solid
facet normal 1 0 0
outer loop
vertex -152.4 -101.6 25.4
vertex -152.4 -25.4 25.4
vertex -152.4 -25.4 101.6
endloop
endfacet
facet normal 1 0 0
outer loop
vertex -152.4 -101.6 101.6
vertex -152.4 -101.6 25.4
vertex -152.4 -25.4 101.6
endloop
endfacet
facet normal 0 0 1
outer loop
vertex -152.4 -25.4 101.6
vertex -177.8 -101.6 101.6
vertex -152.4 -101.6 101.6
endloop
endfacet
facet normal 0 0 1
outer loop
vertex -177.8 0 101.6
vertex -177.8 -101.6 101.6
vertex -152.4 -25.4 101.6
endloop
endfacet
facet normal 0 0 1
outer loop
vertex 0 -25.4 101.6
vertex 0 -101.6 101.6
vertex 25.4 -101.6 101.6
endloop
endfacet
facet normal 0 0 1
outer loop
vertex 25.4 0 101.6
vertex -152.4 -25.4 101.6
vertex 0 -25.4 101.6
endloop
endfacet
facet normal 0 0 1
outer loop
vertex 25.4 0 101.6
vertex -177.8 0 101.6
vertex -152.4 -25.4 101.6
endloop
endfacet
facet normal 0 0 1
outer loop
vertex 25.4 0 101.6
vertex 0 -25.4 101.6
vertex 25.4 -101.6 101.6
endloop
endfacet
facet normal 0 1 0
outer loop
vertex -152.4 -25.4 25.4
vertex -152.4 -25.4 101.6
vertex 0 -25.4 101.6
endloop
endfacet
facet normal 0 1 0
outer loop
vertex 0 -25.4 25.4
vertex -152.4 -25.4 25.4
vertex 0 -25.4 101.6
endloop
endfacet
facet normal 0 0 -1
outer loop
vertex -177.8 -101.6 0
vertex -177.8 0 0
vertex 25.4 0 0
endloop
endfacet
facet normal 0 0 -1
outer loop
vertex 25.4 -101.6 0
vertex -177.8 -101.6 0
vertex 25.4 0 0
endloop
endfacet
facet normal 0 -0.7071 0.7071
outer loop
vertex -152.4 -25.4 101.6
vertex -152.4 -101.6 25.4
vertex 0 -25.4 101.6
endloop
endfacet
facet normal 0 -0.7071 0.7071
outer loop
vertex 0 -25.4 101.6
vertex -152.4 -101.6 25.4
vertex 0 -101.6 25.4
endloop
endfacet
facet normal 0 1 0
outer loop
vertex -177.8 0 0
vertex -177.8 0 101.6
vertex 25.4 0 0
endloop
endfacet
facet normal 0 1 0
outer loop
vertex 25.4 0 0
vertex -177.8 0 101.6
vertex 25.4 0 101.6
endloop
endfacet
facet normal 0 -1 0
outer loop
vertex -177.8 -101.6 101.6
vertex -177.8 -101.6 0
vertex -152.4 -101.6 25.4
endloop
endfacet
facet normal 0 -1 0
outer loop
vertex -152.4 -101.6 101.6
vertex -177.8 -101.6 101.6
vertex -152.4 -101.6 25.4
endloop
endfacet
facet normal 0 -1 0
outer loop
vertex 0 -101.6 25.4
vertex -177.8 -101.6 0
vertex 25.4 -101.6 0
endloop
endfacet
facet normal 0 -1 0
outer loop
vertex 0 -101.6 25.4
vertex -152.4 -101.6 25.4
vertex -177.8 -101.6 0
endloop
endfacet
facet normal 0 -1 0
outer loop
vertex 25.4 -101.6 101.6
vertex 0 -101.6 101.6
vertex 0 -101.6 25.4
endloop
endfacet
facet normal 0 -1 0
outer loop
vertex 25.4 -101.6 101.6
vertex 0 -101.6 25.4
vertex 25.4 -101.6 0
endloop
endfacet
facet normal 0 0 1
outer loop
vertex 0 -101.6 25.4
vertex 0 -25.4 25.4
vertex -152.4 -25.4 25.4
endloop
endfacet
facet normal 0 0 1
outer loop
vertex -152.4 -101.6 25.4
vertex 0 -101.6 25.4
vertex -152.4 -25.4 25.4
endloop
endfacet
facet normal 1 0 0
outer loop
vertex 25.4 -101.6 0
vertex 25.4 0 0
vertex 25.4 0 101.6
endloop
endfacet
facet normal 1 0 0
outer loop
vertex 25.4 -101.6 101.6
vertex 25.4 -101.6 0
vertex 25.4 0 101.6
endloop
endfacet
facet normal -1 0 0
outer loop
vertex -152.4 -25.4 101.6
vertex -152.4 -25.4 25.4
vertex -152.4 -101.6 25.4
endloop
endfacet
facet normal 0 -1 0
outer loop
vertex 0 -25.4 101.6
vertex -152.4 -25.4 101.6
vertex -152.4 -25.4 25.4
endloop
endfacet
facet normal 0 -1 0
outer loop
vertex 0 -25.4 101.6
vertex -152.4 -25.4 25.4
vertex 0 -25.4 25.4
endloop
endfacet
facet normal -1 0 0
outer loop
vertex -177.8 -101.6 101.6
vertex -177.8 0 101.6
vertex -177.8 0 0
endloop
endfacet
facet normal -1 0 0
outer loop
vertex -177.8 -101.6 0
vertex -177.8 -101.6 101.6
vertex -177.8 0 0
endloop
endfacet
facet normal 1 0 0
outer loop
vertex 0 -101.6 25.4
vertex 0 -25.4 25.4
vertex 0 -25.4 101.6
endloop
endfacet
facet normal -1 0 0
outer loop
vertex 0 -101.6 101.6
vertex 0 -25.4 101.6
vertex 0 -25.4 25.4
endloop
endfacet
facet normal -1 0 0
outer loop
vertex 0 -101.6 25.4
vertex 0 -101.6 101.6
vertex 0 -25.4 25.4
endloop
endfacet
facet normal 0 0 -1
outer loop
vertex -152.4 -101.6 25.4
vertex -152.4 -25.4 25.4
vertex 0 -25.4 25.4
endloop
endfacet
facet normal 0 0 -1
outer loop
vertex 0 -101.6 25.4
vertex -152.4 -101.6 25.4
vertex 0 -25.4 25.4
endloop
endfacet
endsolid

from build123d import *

# Parameters (mm, degrees)
F1_DEPTH = 101.6
F0_W     = 152.4
F0_H     = 76.2
F2_DEPTH = 25.4
F3_DEPTH = 76.2
F4_SIZE  = 76.19999


# Not quite as in the source:
# - a fillet or chamfer is up to 0.001 mm smaller than in the source, because OpenCascade refuses the exact size


with BuildPart() as f1:
    # F0 (on Front) → F1 (new body)
    with BuildSketch(Plane.XZ):
        Polygon((-152.4, 0), (0, 0), (25.4, 0), (25.4, 101.6), (0, 101.6), (0, 25.4), (-152.4, 25.4), (-152.4, 101.6), (-177.8, 101.6), (-177.8, 0), align=None)
    extrude(amount=F1_DEPTH)

    # F0 (on Front) → F2 (join)
    with BuildSketch(Plane.XZ):
        with Locations((-76.2, 63.5)):
            Rectangle(F0_W, F0_H)
    extrude(amount=F2_DEPTH)


with BuildPart() as f3:
    # F3 (new): a face of the model
    f3_faces = [f1.part.faces().sort_by_distance(p)[0] for p in [
        (-76.2, -25.4, 63.5),
    ]]
    extrude(f3_faces, amount=F3_DEPTH)

    # F4 (size 76.2 in the source; OpenCascade refuses exactly that, so slightly less here)
    f4_edges = [f3.edges().sort_by_distance(p)[0] for p in [
        (-76.2, -101.6, 101.6),
    ]]
    chamfer(f4_edges, length=F4_SIZE)


solid = Compound([f1.part, f3.part])
